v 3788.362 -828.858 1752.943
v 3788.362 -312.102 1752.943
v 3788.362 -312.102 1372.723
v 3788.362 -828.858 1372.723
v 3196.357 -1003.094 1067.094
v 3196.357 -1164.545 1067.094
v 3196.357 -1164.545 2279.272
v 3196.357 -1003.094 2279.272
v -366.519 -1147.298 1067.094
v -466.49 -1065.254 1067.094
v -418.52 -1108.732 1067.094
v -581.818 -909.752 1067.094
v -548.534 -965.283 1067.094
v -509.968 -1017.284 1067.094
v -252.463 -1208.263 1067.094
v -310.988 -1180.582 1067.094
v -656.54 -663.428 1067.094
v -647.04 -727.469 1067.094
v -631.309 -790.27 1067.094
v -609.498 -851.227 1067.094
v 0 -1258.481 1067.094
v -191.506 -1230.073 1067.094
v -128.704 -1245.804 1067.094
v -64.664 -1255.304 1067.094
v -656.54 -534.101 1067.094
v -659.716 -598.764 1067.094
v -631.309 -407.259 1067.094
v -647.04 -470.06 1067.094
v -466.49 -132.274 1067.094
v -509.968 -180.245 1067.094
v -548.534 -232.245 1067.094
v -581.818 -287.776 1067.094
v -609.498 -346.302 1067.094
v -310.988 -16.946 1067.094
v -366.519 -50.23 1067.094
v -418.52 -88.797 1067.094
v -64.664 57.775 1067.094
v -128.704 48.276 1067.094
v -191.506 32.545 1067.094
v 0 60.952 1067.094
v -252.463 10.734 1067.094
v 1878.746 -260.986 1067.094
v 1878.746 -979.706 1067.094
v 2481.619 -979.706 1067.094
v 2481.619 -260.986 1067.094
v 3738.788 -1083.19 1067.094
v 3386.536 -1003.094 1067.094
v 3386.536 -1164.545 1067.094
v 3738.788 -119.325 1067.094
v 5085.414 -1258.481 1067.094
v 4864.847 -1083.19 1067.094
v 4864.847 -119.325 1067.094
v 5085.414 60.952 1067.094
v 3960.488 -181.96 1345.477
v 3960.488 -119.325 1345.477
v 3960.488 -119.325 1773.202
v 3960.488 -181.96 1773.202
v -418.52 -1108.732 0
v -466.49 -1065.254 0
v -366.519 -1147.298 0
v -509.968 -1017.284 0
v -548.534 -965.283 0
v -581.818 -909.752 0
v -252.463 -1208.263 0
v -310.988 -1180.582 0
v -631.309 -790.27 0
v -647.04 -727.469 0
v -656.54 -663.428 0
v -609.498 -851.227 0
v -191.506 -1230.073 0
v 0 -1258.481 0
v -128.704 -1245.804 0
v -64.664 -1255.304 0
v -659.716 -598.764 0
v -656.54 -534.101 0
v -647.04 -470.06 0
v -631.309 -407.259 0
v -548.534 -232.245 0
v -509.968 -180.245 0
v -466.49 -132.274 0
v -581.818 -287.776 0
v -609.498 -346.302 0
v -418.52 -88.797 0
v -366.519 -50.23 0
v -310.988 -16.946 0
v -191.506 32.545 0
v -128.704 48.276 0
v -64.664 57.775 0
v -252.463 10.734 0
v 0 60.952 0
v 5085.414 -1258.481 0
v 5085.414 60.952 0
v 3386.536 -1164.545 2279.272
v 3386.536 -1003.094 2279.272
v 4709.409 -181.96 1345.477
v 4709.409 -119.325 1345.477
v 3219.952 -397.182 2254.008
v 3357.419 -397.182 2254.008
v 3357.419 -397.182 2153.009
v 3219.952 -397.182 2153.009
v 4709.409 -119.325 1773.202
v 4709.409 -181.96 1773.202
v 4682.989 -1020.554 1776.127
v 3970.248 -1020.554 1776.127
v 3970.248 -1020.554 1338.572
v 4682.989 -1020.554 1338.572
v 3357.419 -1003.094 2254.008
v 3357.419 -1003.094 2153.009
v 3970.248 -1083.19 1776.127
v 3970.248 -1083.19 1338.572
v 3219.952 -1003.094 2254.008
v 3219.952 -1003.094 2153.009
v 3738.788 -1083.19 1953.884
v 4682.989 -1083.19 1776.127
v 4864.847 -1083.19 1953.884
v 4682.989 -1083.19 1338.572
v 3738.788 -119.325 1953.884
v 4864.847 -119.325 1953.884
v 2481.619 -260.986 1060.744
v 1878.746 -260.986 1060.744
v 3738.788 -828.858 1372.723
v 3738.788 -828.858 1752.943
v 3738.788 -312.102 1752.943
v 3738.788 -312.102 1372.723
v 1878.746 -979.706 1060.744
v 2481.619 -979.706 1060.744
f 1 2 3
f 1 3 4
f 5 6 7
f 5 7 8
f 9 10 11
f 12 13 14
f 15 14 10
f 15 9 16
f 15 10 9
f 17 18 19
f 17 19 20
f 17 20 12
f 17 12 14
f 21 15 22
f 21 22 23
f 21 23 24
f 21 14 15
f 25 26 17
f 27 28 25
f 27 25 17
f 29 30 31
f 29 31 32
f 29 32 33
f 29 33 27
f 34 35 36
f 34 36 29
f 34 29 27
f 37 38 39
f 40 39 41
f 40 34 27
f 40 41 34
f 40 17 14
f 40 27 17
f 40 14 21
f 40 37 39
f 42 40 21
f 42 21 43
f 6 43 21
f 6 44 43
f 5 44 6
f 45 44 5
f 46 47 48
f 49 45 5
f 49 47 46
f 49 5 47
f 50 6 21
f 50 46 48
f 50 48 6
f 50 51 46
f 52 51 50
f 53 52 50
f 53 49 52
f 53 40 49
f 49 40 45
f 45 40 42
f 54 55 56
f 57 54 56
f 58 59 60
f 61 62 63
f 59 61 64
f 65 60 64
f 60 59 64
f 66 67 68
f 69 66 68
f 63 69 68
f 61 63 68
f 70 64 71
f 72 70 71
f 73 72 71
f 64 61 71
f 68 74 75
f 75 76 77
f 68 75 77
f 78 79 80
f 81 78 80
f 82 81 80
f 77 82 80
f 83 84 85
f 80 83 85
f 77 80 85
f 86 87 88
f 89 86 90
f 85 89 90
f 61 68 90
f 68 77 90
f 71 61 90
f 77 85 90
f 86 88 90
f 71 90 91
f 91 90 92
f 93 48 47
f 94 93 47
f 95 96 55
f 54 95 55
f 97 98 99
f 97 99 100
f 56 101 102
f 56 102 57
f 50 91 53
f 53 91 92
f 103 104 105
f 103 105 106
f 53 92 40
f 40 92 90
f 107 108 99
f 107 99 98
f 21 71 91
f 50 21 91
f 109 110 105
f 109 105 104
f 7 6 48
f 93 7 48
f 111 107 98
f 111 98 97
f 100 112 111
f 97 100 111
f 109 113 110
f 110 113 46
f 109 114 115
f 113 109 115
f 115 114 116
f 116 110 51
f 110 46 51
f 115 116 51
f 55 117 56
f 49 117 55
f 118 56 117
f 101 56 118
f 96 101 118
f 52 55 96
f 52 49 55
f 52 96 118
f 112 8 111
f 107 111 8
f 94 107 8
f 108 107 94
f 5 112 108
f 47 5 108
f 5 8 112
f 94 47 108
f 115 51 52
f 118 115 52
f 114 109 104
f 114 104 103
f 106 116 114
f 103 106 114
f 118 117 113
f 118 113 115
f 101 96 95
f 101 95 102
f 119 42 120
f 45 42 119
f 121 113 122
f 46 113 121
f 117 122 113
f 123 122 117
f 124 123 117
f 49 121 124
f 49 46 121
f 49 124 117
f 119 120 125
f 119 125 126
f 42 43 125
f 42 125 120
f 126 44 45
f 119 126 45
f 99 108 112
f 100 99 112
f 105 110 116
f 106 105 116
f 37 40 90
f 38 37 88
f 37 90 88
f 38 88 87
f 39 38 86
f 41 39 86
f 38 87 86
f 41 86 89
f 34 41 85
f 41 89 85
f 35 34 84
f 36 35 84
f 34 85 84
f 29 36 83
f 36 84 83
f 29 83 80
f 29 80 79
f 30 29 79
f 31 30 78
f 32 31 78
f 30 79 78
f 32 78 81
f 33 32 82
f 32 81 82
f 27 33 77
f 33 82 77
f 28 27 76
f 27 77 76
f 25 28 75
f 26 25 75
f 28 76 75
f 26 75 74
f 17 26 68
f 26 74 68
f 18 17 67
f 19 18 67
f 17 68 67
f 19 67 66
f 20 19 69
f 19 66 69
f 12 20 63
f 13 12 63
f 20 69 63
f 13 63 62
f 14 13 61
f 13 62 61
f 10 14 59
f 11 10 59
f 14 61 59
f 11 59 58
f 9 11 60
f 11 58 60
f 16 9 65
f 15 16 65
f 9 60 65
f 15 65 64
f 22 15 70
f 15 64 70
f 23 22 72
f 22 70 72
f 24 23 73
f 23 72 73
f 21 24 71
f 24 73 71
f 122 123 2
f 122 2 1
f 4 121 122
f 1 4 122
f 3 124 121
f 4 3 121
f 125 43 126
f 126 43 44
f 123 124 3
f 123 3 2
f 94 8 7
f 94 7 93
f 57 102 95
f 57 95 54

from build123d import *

# Parameters (mm, degrees)
F1_DEPTH  = 1041.6941642761
F2_W      = 1126.0592937469
F2_H      = 963.8655930758
F3_DEPTH  = 912.1903181076
F4_W      = 1126.0592937469
F4_H      = 963.8655930758
F5_DEPTH  = 25.4
F7_W      = 516.755759716
F7_H      = 380.2199363708
F8_DEPTH  = 0.79375
F9_DEPTH  = 49.5742298663
F10_W     = 748.920917511
F10_H     = 427.7250766754
F11_DEPTH = 62.6353546977
F12_W     = 712.7413749695
F12_H     = 437.5553131104
F13_DEPTH = 62.6364
F14_W     = 602.8727293015
F14_H     = 718.7194526196
F15_DEPTH = 6.35
F16_W     = 190.1788711548
F16_H     = 161.4509820938
F17_DEPTH = 1212.1773958206
F18_W     = 137.4664306641
F18_H     = 100.9991168976
F19_DEPTH = 605.9129238129


# Not quite as in the source:
# - a length typed as a fraction of an inch, garbled in the dataset ("3 / 203.2 mm" for 3/8 in), is restored


with BuildPart() as f1:
    # F0 (on Top) → F1 (new body)
    with BuildSketch(Plane.XY):
        with BuildLine():
            Line((1275.3586769104, 60.9520673752), (0, 60.9520673752))
            ThreePointArc((0, 60.9520673752), (-659.7163081169, -598.7642407417), (0, -1258.4805488586))
            Line((0, -1258.4805488586), (5085.4144096375, -1258.4805488586))
            Line((5085.4144096375, -1258.4805488586), (5085.4144096375, 60.9520673752))
            Line((5085.4144096375, 60.9520673752), (1275.3586769104, 60.9520673752))
        make_face()
    extrude(amount=F1_DEPTH)

    # F2 (on face) → F3 (join)
    with BuildSketch(Plane.XY.offset(1041.6941642761)):
        with Locations((4301.8175363541, -601.2575253844)):
            Rectangle(F2_W, F2_H)
    extrude(amount=F3_DEPTH)

    # F4 (on face) → F5 (join)
    with BuildSketch(Plane.XY.offset(1041.6941642761)):
        with BuildLine():
            Line((5085.4144096375, -1258.4805488586), (5085.4144096375, 60.9520673752))
            Line((5085.4144096375, 60.9520673752), (0, 60.9520673752))
            ThreePointArc((0, 60.9520673752), (-659.7163081169, -598.7642407417), (0, -1258.4805488586))
            Line((0, -1258.4805488586), (5085.4144096375, -1258.4805488586))
        make_face()
        with Locations((4301.8175363541, -601.2575253844)):
            Rectangle(F4_W, F4_H, mode=Mode.SUBTRACT)
    extrude(amount=F5_DEPTH)

    # F7 (on face) → F8 (cut)
    with BuildSketch(Plane(origin=(3738.7878894806, 0, 0), x_dir=(0, -1, 0), z_dir=(-1, 0, 0))):
        with Locations((570.4796612263, 1562.8325939178)):
            Rectangle(F7_W, F7_H)
    extrude(amount=-F8_DEPTH, mode=Mode.SUBTRACT)

    # F7 (on face) → F9 (cut)
    with BuildSketch(Plane(origin=(3738.7878894806, 0, 0), x_dir=(0, -1, 0), z_dir=(-1, 0, 0))):
        with Locations((570.4796612263, 1562.8325939178)):
            Rectangle(F7_W, F7_H)
    extrude(amount=-F9_DEPTH, mode=Mode.SUBTRACT)

    # F10 (on face) → F11 (cut)
    with BuildSketch(Plane(origin=(0, -119.3247288465, 0), x_dir=(-1, 0, 0), z_dir=(0, 1, 0))):
        with Locations((-4334.9487781525, 1559.3398809433)):
            Rectangle(F10_W, F10_H)
    extrude(amount=-F11_DEPTH, mode=Mode.SUBTRACT)

    # F12 (on face) → F13 (cut)
    with BuildSketch(Plane.XZ.offset(1083.1903219223)):
        with Locations((4326.6184329987, 1557.3492050171)):
            Rectangle(F12_W, F12_H)
    extrude(amount=-F13_DEPTH, mode=Mode.SUBTRACT)

    # F14 (on face) → F15 (cut)
    with BuildSketch(Plane.XY.offset(1067.0941642761)):
        with Locations((2180.1822781563, -620.3462034464)):
            Rectangle(F14_W, F14_H)
    extrude(amount=-F15_DEPTH, mode=Mode.SUBTRACT)

    # F16 (on face) → F17 (join)
    with BuildSketch(Plane.XY.offset(1067.0941642761)):
        with Locations((3291.446685791, -1083.8199257851)):
            Rectangle(F16_W, F16_H)
    extrude(amount=F17_DEPTH)

    # F18 (on face) → F19 (join)
    with BuildSketch(Plane(origin=(0, -1003.0944347382, 0), x_dir=(-1, 0, 0), z_dir=(0, 1, 0))):
        with Locations((-3288.6855602264, 2203.5087347031)):
            Rectangle(F18_W, F18_H)
    extrude(amount=F19_DEPTH)


solid = f1.part
